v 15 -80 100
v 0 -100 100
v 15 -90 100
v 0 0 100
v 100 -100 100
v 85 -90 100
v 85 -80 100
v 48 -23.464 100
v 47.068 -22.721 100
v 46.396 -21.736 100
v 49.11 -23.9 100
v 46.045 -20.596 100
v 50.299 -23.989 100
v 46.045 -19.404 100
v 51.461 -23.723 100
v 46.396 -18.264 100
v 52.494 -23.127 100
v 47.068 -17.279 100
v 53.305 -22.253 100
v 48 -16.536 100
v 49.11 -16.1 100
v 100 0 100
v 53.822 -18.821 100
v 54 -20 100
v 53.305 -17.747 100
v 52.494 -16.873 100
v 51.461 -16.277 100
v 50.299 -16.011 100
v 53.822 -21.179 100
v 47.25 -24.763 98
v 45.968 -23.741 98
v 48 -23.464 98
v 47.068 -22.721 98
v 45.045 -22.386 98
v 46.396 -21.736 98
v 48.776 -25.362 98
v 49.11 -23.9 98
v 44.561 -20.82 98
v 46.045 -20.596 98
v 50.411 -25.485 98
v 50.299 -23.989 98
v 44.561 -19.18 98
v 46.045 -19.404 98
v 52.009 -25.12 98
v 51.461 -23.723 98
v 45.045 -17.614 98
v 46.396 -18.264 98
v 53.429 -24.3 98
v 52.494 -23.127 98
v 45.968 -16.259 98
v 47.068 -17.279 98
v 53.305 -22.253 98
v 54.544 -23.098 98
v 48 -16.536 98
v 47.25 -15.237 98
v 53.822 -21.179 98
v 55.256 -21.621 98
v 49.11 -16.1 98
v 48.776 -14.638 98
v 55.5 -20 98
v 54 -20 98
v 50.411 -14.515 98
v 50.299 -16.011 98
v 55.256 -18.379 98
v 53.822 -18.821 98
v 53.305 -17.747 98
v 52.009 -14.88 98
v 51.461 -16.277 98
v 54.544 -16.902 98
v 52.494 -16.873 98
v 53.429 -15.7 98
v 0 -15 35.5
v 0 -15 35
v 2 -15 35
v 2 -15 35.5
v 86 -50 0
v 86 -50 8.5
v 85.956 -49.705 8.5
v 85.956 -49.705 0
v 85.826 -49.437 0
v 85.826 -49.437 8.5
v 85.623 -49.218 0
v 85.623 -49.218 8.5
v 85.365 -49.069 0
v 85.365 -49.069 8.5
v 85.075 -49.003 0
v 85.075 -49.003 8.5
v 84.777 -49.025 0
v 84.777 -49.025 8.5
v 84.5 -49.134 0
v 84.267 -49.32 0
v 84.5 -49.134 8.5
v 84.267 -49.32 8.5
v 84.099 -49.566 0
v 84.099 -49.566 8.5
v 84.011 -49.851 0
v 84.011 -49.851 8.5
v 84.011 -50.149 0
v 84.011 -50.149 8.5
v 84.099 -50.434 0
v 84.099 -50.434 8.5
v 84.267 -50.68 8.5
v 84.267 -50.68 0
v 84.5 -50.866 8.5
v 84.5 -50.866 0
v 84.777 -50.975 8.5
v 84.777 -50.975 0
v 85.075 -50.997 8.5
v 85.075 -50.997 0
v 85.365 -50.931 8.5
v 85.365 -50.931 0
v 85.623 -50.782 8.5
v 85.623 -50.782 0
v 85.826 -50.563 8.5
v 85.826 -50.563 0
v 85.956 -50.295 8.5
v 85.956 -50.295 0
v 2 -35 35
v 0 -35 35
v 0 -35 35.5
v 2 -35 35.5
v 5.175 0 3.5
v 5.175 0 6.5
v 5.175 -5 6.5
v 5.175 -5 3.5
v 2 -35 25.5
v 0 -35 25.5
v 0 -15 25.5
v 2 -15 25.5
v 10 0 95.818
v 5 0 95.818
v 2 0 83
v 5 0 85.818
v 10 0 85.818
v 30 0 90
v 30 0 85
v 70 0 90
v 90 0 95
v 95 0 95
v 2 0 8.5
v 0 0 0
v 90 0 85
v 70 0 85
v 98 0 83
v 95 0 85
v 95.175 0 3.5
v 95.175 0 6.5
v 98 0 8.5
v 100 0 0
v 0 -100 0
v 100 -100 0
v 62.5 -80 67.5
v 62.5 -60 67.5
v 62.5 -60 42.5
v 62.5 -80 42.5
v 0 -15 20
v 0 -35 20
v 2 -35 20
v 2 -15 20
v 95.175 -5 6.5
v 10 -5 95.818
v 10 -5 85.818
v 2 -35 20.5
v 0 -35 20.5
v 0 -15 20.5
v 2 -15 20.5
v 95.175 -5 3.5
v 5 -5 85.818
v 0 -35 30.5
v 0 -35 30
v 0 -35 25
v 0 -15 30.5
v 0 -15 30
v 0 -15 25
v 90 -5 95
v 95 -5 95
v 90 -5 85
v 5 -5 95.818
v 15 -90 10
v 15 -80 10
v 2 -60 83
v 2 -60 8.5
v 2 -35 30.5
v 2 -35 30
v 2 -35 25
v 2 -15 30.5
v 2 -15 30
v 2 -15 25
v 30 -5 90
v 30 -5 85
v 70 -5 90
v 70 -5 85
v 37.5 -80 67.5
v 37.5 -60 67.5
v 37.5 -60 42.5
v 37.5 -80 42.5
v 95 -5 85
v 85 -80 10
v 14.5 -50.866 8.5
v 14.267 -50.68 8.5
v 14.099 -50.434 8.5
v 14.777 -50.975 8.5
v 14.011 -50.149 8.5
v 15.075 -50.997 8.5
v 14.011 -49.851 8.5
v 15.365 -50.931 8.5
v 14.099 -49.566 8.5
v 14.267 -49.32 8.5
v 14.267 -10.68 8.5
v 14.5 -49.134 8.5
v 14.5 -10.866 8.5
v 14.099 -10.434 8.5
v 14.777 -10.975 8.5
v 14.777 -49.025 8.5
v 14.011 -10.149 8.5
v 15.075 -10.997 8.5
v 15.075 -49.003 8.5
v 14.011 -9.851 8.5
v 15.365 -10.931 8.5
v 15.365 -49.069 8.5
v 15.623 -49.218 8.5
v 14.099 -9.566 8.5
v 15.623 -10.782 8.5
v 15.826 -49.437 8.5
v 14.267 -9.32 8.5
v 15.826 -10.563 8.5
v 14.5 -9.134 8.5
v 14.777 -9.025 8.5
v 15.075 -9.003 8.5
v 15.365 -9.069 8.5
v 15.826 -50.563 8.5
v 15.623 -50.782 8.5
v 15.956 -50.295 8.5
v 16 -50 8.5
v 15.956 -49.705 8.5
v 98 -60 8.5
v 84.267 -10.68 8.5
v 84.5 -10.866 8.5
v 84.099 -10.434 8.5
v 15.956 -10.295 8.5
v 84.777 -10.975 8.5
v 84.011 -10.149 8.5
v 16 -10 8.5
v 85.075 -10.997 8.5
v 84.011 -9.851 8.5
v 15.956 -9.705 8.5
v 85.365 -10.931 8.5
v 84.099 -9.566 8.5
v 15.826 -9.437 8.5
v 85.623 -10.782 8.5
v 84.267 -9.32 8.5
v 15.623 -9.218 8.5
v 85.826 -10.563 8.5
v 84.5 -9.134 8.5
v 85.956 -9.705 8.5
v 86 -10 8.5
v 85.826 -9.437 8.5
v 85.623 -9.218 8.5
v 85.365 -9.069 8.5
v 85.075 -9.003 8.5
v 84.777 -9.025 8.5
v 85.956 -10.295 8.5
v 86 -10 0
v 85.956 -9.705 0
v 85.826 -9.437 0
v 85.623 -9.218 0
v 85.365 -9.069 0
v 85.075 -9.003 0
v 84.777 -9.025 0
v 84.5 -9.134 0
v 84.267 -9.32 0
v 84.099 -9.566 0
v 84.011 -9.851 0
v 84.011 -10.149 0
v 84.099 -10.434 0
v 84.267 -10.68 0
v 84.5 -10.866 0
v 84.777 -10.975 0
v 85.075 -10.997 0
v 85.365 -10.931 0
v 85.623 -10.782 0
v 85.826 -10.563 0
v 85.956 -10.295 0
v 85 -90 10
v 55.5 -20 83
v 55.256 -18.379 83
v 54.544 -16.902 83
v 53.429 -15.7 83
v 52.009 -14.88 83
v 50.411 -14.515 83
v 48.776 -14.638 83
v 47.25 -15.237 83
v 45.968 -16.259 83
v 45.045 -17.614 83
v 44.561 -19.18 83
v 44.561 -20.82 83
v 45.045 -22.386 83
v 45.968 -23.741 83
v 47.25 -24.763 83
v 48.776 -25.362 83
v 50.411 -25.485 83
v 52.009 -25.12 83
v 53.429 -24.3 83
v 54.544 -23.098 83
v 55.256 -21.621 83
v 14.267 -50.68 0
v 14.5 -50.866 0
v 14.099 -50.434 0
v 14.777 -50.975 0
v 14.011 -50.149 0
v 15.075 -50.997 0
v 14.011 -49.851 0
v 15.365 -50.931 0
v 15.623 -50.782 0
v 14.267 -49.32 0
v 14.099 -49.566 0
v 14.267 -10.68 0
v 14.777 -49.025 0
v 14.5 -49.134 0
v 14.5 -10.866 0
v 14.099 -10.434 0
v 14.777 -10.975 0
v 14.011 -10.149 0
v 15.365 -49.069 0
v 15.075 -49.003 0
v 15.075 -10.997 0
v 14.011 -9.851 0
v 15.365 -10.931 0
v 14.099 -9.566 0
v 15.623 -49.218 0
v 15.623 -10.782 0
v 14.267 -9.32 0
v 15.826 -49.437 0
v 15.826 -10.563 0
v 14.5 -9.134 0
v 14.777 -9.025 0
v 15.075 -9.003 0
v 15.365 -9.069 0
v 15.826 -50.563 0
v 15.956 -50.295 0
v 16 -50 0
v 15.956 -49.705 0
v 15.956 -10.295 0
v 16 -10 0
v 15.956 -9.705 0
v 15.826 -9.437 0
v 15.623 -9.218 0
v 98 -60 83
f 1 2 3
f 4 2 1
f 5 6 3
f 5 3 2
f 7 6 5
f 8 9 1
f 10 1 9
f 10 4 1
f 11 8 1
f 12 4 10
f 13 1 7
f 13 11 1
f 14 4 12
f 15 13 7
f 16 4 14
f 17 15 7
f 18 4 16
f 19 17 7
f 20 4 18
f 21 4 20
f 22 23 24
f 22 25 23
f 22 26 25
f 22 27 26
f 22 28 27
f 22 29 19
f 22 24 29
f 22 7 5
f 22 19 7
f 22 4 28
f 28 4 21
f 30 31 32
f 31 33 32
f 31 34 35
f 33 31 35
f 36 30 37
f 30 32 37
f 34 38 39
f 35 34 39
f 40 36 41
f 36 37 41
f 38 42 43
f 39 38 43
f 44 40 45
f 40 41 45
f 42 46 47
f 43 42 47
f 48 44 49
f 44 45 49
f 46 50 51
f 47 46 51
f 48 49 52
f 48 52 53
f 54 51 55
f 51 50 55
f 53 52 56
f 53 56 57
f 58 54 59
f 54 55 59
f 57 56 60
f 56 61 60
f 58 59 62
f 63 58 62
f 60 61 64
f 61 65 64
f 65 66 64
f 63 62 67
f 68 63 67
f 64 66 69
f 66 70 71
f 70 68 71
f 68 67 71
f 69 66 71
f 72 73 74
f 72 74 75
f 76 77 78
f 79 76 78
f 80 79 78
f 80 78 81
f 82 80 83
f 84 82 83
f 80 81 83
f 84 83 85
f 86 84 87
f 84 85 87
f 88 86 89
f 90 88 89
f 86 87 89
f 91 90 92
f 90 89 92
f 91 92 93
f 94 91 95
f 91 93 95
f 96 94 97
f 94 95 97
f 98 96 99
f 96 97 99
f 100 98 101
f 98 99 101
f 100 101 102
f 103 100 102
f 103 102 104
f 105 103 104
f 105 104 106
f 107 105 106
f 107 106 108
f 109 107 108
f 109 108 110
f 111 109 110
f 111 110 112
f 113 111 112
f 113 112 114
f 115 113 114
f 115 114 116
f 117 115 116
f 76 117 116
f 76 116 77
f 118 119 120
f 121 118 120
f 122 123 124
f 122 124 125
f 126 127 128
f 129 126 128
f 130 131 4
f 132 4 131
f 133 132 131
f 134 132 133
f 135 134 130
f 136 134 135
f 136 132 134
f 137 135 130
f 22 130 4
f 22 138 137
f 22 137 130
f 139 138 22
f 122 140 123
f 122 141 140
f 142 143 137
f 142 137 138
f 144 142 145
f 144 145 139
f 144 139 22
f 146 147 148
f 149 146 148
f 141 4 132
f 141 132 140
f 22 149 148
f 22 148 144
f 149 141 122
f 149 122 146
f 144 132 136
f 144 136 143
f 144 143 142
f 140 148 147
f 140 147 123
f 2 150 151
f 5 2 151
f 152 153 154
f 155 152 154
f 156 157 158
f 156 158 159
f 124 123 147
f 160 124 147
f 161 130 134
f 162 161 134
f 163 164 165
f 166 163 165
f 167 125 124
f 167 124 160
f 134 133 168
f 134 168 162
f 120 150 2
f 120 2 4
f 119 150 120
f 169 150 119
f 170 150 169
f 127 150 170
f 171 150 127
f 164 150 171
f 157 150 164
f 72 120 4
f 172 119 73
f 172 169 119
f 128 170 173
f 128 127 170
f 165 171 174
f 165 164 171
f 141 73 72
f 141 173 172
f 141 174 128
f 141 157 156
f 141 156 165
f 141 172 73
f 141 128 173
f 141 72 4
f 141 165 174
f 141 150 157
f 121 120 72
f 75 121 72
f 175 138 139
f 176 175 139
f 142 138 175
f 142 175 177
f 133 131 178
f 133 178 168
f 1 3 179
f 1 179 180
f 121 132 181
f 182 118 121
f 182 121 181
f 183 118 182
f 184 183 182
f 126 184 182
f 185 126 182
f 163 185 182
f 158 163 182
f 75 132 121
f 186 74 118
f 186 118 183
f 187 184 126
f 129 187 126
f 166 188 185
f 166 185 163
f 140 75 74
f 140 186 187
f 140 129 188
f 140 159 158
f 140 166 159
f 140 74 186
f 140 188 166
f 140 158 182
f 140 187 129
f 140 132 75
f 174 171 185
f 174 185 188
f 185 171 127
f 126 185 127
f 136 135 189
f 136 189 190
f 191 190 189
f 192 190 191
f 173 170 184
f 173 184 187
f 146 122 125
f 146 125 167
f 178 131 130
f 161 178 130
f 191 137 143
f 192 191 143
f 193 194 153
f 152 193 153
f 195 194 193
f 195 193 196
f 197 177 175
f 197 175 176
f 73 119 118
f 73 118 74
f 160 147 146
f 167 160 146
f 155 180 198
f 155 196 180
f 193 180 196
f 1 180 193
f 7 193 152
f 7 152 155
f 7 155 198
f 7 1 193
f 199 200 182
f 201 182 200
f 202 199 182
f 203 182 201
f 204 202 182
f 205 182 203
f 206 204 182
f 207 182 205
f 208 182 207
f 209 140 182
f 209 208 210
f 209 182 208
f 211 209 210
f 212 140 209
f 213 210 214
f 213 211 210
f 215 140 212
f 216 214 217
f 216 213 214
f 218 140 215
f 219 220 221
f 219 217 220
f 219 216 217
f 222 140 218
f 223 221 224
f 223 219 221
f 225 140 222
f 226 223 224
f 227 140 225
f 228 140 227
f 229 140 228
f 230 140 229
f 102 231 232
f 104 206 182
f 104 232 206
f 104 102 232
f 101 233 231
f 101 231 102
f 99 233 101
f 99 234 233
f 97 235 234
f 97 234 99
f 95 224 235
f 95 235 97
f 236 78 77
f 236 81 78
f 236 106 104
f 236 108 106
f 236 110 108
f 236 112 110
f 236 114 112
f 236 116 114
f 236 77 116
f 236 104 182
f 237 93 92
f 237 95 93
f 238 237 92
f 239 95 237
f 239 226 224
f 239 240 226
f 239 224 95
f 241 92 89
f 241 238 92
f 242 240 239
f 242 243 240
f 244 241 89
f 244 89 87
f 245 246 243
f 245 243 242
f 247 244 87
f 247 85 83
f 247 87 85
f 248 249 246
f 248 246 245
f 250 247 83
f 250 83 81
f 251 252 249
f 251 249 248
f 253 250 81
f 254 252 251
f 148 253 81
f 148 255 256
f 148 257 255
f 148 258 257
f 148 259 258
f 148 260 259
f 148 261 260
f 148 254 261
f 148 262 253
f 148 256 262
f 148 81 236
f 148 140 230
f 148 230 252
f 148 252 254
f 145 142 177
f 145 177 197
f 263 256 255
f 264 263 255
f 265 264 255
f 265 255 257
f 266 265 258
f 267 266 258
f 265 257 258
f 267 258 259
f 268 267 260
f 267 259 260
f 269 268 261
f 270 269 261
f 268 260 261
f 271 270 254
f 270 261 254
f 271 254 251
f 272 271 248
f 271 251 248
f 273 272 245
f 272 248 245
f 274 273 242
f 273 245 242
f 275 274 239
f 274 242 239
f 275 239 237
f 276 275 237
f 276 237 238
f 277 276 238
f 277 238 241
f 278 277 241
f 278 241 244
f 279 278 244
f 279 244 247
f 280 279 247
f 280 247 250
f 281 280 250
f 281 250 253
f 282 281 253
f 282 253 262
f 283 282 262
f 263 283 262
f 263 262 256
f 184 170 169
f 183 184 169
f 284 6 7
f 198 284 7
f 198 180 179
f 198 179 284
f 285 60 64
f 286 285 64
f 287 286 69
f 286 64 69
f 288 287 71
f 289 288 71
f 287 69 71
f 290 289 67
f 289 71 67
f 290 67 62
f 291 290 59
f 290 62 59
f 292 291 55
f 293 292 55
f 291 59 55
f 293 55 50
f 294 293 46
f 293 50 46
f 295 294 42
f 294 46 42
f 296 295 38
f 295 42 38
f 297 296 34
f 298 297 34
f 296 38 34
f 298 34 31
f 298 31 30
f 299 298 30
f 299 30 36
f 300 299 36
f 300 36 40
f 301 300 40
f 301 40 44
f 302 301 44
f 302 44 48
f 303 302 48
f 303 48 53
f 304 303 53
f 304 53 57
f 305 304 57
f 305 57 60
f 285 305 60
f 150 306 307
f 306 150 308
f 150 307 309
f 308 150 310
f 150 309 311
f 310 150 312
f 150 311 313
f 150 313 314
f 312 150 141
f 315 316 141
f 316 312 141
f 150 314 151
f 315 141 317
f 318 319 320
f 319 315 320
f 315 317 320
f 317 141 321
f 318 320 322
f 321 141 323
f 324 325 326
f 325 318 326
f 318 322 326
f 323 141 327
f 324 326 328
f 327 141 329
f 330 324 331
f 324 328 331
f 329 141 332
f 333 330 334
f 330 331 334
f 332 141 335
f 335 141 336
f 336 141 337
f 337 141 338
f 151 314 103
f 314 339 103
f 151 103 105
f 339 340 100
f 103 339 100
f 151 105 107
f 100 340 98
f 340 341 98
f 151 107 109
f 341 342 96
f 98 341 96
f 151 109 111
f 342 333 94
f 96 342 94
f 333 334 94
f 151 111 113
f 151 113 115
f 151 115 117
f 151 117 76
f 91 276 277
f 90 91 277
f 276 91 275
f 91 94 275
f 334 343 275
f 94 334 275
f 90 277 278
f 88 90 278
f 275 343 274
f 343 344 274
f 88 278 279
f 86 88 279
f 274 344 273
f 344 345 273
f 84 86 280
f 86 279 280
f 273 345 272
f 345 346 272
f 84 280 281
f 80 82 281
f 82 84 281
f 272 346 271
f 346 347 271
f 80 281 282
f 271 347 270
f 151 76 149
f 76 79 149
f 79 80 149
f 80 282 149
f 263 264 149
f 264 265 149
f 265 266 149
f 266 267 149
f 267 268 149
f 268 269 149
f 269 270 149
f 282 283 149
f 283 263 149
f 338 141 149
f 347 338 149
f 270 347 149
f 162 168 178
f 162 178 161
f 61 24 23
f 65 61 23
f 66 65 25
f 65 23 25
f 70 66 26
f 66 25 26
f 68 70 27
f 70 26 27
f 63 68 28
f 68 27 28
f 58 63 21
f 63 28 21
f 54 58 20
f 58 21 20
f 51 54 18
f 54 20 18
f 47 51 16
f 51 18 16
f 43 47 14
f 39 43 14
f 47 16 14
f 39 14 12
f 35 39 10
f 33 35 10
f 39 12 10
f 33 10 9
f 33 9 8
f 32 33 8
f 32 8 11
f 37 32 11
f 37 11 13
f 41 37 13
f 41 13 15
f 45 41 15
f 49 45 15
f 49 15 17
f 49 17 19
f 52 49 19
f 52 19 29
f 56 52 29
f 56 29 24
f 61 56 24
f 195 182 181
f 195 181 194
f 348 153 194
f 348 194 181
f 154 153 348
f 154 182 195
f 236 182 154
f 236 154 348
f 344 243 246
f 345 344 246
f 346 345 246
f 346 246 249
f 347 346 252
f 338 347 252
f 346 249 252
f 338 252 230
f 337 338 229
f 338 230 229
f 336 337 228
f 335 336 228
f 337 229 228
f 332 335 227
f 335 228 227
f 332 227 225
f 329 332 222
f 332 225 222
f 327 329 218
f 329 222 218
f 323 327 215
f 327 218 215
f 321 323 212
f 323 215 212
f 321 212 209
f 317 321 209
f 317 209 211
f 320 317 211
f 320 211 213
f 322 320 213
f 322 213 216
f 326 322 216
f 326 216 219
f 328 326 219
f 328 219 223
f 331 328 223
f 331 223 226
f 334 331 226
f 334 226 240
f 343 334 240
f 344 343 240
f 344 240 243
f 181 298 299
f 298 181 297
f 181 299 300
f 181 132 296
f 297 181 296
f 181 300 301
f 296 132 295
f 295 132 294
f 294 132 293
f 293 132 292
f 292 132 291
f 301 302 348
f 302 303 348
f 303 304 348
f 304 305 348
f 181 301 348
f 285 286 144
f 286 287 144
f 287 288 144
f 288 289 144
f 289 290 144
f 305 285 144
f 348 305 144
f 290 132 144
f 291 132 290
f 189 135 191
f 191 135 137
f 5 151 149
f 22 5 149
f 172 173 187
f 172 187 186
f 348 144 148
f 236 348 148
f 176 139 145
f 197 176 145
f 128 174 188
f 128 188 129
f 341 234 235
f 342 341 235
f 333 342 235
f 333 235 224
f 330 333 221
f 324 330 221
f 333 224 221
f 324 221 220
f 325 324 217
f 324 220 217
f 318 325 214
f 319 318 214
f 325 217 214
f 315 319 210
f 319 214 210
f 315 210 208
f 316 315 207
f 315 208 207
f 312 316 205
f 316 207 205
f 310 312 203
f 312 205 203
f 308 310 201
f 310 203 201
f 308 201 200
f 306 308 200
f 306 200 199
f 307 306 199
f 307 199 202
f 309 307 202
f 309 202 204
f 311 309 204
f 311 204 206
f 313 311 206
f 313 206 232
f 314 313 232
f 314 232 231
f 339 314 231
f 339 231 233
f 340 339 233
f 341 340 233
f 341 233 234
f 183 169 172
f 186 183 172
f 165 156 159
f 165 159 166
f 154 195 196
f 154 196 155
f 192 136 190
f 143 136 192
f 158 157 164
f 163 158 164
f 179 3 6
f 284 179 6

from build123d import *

# Parameters (mm, degrees)
SKETCH1_W           = 100
SKETCH1_H           = 100
BOSS_EXTRUDE1_DEPTH = 100
SKETCH2_W           = 90
SKETCH2_H           = 70
CUT_EXTRUDE1_DEPTH  = 50
SKETCH3_W           = 25
SKETCH3_H           = 25
CUT_EXTRUDE2_DEPTH  = 30
SKETCH4_W           = 70
SKETCH4_H           = 10
CUT_EXTRUDE3_DEPTH  = 70
SKETCH9_W           = 0.5
SKETCH9_H           = 20
CUT_EXTRUDE7_DEPTH  = 10
SKETCH15_W          = 40
SKETCH15_H          = 5
CUT_EXTRUDE8_DEPTH  = 5
SKETCH16_W          = 5
SKETCH16_H          = 10
CUT_EXTRUDE9_DEPTH  = 5
SKETCH17_W          = 5
SKETCH17_H          = 10
CUT_EXTRUDE10_DEPTH = 5
SKETCH20_W          = 70
SKETCH20_H          = 10
CUT_EXTRUDE11_DEPTH = 20
SKETCH21_W          = 90
SKETCH21_H          = 3
CUT_EXTRUDE12_DEPTH = 5
SKETCH23_W          = 90
SKETCH23_H          = 70
CUT_EXTRUDE14_DEPTH = 10
SKETCH26_R          = 1
CUT_EXTRUDE16_DEPTH = 10
SKETCH29_R          = 4
CUT_EXTRUDE20_DEPTH = 11
CUT_EXTRUDE21_START = -2
SKETCH30_R          = 5.5
CUT_EXTRUDE21_DEPTH = 20
SKETCH31_W          = 96
SKETCH31_H          = 74.5
CUT_EXTRUDE22_DEPTH = 60


with BuildPart() as part:
    # Sketch1 → Boss-Extrude1 (new body)
    with BuildSketch(Plane.XY):
        with Locations((50, -50)):
            Rectangle(SKETCH1_W, SKETCH1_H)
    extrude(amount=BOSS_EXTRUDE1_DEPTH)

    # Sketch2 → Cut-Extrude1 (cut)
    with BuildSketch(Plane(origin=(0, 0, 0), x_dir=(1, 0, 0), z_dir=(0, 1, 0))):
        with Locations((50, -45)):
            Rectangle(SKETCH2_W, SKETCH2_H)
    extrude(amount=-CUT_EXTRUDE1_DEPTH, mode=Mode.SUBTRACT)

    # Sketch3 → Cut-Extrude2 (cut)
    with BuildSketch(Plane(origin=(0, -50, 0), x_dir=(1, 0, 0), z_dir=(0, 1, 0))):
        with Locations((50, -55)):
            Rectangle(SKETCH3_W, SKETCH3_H)
    extrude(amount=-CUT_EXTRUDE2_DEPTH, mode=Mode.SUBTRACT)

    # Sketch4 → Cut-Extrude3 (cut)
    with BuildSketch(Plane.XY.offset(100)):
        with Locations((50, -85)):
            Rectangle(SKETCH4_W, SKETCH4_H)
    extrude(amount=-CUT_EXTRUDE3_DEPTH, mode=Mode.SUBTRACT)

    # Sketch9 → Cut-Extrude7 (cut)
    with BuildSketch(Plane.ZY):
        with Locations((20.25, -25)):
            Rectangle(SKETCH9_W, SKETCH9_H)
        with Locations((25.25, -25)):
            Rectangle(SKETCH9_W, SKETCH9_H)
        with Locations((30.25, -25)):
            Rectangle(SKETCH9_W, SKETCH9_H)
        with Locations((35.25, -25)):
            Rectangle(SKETCH9_W, SKETCH9_H)
    extrude(amount=-CUT_EXTRUDE7_DEPTH, mode=Mode.SUBTRACT)

    # Sketch15 → Cut-Extrude8 (cut)
    with BuildSketch(Plane(origin=(0, 0, 0), x_dir=(1, 0, 0), z_dir=(0, 1, 0))):
        with Locations((50, -87.5)):
            Rectangle(SKETCH15_W, SKETCH15_H)
    extrude(amount=-CUT_EXTRUDE8_DEPTH, mode=Mode.SUBTRACT)

    # Sketch16 → Cut-Extrude9 (cut)
    with BuildSketch(Plane(origin=(0, 0, 0), x_dir=(1, 0, 0), z_dir=(0, 1, 0))):
        with Locations((7.5, -90.818061544)):
            Rectangle(SKETCH16_W, SKETCH16_H)
    extrude(amount=-CUT_EXTRUDE9_DEPTH, mode=Mode.SUBTRACT)

    # Sketch17 → Cut-Extrude10 (cut)
    with BuildSketch(Plane(origin=(0, 0, 0), x_dir=(1, 0, 0), z_dir=(0, 1, 0))):
        with Locations((92.5, -90)):
            Rectangle(SKETCH17_W, SKETCH17_H)
    extrude(amount=-CUT_EXTRUDE10_DEPTH, mode=Mode.SUBTRACT)

    # Sketch20 → Cut-Extrude11 (cut)
    with BuildSketch(Plane.XY.offset(30)):
        with Locations((50, -85)):
            Rectangle(SKETCH20_W, SKETCH20_H)
    extrude(amount=-CUT_EXTRUDE11_DEPTH, mode=Mode.SUBTRACT)

    # Sketch21 → Cut-Extrude12 (cut)
    with BuildSketch(Plane(origin=(0, 0, 0), x_dir=(1, 0, 0), z_dir=(0, 1, 0))):
        with Locations((50.175260559, -5)):
            Rectangle(SKETCH21_W, SKETCH21_H)
    extrude(amount=-CUT_EXTRUDE12_DEPTH, mode=Mode.SUBTRACT)

    # Sketch23 → Cut-Extrude14 (cut)
    with BuildSketch(Plane(origin=(0, -50, 0), x_dir=(1, 0, 0), z_dir=(0, 1, 0))):
        with Locations((50, -45)):
            Rectangle(SKETCH23_W, SKETCH23_H)
    extrude(amount=-CUT_EXTRUDE14_DEPTH, mode=Mode.SUBTRACT)

    # Sketch26 → Cut-Extrude16 (cut)
    with BuildSketch(Plane.XY.offset(10)):
        with Locations((15, -10)):
            Circle(SKETCH26_R)
        with Locations((85, -10)):
            Circle(SKETCH26_R)
        with Locations((85, -50)):
            Circle(SKETCH26_R)
        with Locations((15, -50)):
            Circle(SKETCH26_R)
    extrude(amount=-CUT_EXTRUDE16_DEPTH, mode=Mode.SUBTRACT)

    # Sketch29 → Cut-Extrude20 (cut)
    with BuildSketch(Plane.XY.offset(100)):
        with Locations((50, -20)):
            Circle(SKETCH29_R)
    extrude(amount=-CUT_EXTRUDE20_DEPTH, mode=Mode.SUBTRACT)

    # Sketch30 → Cut-Extrude21 (cut)
    with BuildSketch(Plane.XY.offset(100).offset(CUT_EXTRUDE21_START)):
        with Locations((50, -20)):
            Circle(SKETCH30_R)
    extrude(amount=-CUT_EXTRUDE21_DEPTH, mode=Mode.SUBTRACT)

    # Sketch31 → Cut-Extrude22 (cut)
    with BuildSketch(Plane(origin=(0, 0, 0), x_dir=(1, 0, 0), z_dir=(0, 1, 0))):
        with Locations((50, -45.75)):
            Rectangle(SKETCH31_W, SKETCH31_H)
    extrude(amount=-CUT_EXTRUDE22_DEPTH, mode=Mode.SUBTRACT)


solid = part.part
